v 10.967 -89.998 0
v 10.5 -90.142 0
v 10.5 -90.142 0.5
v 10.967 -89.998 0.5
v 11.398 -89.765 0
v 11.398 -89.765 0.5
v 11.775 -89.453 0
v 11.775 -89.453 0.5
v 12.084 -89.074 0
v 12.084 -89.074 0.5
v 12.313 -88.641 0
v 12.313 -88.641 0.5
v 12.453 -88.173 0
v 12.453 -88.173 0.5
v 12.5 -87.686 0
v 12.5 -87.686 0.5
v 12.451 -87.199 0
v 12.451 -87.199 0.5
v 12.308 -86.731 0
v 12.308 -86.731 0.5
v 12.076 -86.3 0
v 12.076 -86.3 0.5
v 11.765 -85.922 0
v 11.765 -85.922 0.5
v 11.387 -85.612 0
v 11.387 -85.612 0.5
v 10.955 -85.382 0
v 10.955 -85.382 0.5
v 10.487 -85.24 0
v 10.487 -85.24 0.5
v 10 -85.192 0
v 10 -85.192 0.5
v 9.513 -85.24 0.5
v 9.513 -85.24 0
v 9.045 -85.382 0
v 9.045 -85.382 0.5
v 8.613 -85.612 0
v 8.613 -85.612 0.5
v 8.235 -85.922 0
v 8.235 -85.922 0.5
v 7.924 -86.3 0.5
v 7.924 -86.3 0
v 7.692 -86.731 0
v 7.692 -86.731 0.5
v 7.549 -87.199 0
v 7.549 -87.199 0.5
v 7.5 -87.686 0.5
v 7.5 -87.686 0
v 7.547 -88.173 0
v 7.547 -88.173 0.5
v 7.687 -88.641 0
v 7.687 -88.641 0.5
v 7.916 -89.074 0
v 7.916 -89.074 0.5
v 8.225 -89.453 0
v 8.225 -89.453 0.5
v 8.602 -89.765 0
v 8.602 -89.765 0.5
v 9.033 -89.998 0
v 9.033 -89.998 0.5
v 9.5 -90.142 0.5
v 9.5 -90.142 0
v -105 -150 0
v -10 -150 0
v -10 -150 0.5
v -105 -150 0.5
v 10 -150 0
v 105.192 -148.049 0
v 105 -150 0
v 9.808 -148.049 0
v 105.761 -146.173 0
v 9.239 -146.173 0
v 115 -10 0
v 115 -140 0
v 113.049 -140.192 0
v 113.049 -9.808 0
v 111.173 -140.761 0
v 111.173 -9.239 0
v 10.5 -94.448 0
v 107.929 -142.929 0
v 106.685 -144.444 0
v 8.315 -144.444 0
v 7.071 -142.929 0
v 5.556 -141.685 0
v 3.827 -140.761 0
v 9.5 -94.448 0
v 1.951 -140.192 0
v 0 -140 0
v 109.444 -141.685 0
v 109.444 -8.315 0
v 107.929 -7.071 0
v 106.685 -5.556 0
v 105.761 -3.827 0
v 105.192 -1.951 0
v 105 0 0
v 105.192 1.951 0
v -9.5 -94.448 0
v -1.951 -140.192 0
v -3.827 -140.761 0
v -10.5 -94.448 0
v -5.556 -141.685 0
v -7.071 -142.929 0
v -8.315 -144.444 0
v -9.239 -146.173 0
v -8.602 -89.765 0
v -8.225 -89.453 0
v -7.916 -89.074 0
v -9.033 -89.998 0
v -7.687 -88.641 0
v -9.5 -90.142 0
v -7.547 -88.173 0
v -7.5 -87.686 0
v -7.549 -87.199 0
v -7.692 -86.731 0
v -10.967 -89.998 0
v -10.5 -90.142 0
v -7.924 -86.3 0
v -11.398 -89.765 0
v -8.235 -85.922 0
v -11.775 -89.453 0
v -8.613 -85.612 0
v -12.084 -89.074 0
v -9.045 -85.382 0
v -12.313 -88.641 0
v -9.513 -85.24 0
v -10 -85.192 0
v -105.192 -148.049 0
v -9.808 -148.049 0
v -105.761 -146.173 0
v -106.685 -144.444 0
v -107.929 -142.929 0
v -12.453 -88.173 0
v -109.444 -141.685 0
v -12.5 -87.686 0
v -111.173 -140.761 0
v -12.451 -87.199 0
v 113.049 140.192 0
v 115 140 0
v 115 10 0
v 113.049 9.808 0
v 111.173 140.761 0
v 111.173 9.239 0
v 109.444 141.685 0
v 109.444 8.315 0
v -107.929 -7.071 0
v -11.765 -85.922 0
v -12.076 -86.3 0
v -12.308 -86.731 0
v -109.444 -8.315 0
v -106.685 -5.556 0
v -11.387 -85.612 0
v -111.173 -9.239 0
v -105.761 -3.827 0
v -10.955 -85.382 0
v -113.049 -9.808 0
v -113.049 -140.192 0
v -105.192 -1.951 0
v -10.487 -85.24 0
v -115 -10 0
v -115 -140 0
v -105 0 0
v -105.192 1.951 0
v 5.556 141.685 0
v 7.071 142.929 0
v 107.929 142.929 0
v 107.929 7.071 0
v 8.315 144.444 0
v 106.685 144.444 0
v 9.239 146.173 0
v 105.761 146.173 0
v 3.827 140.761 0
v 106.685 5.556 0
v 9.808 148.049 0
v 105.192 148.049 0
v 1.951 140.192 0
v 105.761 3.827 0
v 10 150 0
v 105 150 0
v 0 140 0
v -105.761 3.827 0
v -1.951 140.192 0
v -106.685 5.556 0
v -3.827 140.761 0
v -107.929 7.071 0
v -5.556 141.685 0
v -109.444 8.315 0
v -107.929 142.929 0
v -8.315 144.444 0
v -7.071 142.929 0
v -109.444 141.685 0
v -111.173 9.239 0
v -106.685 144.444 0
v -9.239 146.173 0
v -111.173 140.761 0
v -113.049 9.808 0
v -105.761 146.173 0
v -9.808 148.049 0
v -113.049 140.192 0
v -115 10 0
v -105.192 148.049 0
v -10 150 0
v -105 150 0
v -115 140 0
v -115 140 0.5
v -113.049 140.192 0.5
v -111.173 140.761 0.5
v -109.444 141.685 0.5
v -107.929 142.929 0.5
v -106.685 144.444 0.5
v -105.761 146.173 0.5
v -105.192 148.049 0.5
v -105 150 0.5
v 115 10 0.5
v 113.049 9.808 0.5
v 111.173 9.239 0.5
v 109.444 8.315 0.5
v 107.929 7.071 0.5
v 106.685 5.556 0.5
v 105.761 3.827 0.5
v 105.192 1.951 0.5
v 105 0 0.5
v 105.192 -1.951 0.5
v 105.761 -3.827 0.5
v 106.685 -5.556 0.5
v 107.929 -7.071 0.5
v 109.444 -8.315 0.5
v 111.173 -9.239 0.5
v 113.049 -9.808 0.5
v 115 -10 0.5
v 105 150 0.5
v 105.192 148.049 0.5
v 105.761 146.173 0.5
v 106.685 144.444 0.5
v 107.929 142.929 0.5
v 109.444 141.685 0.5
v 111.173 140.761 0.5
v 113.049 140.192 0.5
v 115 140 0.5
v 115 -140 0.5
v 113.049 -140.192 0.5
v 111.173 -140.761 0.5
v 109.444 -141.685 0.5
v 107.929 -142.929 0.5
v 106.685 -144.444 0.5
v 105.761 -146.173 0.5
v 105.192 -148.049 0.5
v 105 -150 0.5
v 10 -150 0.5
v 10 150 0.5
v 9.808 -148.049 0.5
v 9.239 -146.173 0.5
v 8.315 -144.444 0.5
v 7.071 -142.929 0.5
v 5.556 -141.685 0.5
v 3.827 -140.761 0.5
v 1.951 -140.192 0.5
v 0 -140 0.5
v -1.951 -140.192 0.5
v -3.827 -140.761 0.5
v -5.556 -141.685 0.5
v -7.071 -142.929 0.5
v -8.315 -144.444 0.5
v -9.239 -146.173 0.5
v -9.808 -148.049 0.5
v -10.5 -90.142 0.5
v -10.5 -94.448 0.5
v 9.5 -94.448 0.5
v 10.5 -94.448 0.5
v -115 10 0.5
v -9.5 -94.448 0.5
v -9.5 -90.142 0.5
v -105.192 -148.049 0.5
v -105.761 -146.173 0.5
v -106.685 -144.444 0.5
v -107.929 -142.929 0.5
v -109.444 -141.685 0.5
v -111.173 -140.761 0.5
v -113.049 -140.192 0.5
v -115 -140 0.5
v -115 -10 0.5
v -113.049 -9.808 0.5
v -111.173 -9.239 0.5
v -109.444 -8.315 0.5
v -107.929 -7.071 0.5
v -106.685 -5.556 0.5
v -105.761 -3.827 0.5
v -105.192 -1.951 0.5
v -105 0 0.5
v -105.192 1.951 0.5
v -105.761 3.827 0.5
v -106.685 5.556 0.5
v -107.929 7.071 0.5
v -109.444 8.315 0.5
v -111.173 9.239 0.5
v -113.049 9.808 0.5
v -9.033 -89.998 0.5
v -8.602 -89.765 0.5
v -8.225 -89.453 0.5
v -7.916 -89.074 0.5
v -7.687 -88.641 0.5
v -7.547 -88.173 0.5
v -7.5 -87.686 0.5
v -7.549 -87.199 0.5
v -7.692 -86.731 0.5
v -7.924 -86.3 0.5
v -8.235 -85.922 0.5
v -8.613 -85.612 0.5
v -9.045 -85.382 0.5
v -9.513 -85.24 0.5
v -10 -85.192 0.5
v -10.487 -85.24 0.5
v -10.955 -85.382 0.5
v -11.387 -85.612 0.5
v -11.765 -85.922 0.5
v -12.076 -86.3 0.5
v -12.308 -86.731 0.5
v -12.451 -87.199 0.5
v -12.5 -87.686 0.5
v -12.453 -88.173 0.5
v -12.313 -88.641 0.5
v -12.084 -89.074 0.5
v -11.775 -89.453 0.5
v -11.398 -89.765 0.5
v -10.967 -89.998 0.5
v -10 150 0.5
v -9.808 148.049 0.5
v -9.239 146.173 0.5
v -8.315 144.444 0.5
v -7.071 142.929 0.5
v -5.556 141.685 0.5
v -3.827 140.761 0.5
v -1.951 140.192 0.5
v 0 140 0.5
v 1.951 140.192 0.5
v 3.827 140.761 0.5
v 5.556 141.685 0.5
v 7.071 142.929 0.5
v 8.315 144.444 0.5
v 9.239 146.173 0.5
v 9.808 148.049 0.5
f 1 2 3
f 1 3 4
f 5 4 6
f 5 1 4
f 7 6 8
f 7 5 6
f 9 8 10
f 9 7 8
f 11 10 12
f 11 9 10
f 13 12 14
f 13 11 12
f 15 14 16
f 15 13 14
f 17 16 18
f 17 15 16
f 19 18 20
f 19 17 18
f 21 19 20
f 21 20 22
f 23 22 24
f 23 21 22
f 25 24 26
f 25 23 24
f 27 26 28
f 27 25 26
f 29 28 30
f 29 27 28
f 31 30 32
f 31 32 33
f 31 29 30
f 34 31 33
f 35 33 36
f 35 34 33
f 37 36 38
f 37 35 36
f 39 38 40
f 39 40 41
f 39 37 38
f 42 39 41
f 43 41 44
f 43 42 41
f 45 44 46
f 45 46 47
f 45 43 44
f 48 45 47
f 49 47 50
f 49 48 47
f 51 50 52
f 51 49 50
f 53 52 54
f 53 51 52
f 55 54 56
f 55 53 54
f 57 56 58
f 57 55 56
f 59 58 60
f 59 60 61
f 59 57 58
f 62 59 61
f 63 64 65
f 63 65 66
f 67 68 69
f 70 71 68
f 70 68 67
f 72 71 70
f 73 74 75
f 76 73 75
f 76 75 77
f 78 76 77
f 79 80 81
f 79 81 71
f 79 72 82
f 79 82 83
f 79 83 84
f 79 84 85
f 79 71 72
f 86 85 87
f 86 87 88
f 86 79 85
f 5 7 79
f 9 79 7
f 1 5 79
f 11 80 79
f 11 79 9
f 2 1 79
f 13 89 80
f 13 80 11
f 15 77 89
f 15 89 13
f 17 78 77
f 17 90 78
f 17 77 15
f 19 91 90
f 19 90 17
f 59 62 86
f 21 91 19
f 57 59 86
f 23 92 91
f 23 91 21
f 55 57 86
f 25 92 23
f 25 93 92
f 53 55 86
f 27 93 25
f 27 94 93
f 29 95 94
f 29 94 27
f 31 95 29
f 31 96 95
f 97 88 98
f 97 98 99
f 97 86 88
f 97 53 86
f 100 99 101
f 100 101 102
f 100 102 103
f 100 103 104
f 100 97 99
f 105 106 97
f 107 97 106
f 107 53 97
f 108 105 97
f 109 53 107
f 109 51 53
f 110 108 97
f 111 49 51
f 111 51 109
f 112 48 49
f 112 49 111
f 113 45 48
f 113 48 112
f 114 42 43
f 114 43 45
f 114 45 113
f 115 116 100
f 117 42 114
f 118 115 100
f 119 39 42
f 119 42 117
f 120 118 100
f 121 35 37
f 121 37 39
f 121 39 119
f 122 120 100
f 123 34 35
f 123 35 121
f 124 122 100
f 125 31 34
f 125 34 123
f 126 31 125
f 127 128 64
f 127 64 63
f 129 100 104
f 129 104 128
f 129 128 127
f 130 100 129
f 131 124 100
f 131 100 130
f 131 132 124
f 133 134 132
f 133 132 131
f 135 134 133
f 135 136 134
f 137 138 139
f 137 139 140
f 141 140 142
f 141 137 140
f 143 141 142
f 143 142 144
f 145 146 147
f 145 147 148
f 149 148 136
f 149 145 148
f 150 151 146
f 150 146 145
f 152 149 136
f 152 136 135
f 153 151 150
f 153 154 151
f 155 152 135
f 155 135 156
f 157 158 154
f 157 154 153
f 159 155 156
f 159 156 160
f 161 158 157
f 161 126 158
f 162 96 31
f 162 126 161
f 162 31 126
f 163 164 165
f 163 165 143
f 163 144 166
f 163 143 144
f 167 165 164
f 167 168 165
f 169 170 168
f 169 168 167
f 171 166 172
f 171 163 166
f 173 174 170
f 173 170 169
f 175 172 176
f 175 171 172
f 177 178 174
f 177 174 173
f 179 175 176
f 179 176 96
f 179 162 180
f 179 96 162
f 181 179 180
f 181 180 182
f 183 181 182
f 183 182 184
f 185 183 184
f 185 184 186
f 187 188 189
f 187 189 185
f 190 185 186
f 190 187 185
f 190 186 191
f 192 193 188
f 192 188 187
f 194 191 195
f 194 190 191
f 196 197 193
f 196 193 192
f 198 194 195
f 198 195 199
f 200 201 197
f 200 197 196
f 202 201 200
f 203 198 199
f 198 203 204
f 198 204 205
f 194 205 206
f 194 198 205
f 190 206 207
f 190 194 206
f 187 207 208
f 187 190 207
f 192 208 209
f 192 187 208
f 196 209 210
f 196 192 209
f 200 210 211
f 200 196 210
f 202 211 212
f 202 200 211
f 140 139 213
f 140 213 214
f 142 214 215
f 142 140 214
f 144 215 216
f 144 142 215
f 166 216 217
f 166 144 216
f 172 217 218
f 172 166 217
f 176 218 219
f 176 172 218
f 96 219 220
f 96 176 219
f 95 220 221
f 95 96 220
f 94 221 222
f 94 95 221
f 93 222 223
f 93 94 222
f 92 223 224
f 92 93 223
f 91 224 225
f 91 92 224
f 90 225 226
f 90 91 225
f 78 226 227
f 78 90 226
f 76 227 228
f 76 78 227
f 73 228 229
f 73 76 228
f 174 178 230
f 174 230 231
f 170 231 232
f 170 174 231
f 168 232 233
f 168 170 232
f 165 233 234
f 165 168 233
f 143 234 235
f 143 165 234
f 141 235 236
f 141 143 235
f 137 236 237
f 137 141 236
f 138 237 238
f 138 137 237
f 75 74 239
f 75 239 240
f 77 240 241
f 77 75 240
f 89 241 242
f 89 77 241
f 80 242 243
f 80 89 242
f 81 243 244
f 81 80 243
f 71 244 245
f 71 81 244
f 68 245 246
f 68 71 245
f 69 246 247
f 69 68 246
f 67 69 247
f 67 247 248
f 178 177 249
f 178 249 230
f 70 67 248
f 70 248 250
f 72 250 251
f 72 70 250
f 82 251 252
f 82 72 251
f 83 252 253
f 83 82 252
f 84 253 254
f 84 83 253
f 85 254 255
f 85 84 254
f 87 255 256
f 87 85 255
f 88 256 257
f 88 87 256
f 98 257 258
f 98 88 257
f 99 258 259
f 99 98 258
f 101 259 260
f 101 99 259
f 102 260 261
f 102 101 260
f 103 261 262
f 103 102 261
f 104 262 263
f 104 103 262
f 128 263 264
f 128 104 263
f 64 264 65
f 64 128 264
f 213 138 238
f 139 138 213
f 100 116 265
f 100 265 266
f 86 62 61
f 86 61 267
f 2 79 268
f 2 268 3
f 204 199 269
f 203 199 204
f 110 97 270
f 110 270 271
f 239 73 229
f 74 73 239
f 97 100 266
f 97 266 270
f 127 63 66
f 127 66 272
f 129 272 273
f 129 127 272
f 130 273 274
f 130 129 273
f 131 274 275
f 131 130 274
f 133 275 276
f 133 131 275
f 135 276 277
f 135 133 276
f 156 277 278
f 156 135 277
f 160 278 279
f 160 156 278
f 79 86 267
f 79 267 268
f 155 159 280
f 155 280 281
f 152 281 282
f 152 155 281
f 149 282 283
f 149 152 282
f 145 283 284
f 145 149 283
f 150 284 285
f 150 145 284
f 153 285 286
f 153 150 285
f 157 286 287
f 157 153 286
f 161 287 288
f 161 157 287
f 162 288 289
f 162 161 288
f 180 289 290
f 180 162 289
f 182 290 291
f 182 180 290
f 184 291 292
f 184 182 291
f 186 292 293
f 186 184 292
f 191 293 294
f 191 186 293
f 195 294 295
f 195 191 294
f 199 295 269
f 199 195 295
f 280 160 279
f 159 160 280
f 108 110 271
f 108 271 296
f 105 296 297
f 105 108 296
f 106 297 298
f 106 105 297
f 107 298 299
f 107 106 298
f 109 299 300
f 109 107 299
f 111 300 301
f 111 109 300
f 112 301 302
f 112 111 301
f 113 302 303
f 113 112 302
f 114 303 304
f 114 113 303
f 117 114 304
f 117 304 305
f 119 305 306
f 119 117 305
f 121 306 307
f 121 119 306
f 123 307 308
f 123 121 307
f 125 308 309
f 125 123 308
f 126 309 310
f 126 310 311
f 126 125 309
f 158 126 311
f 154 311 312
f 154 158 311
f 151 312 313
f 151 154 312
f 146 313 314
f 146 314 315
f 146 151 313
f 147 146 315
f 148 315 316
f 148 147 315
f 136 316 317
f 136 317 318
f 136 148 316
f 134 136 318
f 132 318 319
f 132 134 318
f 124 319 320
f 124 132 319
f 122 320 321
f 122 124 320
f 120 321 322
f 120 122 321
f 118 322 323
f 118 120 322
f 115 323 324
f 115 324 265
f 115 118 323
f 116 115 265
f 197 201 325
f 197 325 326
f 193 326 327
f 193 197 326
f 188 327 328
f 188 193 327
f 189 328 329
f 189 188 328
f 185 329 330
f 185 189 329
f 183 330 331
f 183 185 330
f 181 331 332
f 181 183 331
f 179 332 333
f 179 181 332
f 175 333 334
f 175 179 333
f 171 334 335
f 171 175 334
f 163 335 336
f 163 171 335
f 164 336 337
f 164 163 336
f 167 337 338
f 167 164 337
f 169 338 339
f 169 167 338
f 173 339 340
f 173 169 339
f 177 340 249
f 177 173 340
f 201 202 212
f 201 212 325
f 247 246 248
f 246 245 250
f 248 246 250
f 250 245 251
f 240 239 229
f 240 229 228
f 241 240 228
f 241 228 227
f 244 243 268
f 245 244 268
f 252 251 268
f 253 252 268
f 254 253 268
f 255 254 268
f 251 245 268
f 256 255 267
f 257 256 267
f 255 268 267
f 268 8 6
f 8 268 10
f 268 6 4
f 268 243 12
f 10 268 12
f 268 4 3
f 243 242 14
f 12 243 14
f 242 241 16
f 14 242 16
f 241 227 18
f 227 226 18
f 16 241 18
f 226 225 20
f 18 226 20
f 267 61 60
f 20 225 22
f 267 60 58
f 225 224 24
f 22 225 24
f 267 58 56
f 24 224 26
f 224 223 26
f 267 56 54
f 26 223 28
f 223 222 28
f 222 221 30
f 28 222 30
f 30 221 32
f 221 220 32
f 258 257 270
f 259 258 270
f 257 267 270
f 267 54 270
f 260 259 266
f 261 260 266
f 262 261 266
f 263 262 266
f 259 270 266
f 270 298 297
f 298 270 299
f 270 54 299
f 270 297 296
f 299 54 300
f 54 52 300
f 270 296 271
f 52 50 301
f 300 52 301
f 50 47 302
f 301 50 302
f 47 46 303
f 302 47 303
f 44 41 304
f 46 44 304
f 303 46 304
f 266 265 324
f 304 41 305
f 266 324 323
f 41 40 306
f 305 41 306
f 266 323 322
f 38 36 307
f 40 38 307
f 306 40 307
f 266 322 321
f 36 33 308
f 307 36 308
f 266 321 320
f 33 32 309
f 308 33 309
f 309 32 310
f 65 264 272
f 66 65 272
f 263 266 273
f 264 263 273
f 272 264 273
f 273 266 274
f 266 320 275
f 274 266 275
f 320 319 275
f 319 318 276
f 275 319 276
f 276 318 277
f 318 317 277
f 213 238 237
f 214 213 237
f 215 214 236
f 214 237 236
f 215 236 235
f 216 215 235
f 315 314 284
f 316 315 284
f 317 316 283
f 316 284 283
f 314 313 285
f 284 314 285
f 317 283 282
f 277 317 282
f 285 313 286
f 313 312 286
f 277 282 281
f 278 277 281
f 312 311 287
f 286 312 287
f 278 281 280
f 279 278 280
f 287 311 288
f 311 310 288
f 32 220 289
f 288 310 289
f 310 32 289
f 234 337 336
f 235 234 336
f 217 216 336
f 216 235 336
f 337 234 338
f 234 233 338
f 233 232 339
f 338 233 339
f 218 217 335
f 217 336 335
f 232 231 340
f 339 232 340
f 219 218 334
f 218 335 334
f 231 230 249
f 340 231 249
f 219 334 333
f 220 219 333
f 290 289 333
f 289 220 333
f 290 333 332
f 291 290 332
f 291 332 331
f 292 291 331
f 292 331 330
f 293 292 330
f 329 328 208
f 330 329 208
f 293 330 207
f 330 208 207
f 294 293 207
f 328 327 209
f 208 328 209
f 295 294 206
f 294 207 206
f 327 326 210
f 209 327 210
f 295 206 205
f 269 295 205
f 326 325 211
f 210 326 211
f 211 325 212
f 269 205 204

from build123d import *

# Parameters (mm, degrees)
BOSS_EXTRUDE1_DEPTH = 0.5


with BuildPart() as part:
    # Sketch1 → Boss-Extrude1 (new body)
    with BuildSketch(Plane(origin=(0, 0, 0), x_dir=(-1, 0, 0), z_dir=(0, 0, -1))):
        with BuildLine():
            Line((105, 150), (10, 150))
            ThreePointArc((10, 150), (0, 140), (-10, 150))
            Line((-10, 150), (-105, 150))
            ThreePointArc((-105, 150), (-107.928932188, 142.928932188), (-115, 140))
            Line((-115, 140), (-115, 10))
            ThreePointArc((-115, 10), (-105, 0), (-115, -10))
            Line((-115, -10), (-115, -140))
            ThreePointArc((-115, -140), (-107.928932188, -142.928932188), (-105, -150))
            Line((-105, -150), (-10, -150))
            ThreePointArc((-10, -150), (0, -140), (10, -150))
            Line((10, -150), (105, -150))
            ThreePointArc((105, -150), (107.928932188, -142.928932188), (115, -140))
            Line((115, -140), (115, -10))
            ThreePointArc((115, -10), (105, 0), (115, 10))
            Line((115, 10), (115, 140))
            ThreePointArc((115, 140), (107.928932188, 142.928932188), (105, 150))
        make_face()
        with BuildLine():
            Line((9.5, -94.448385239), (9.5, -90.141798169))
            ThreePointArc((9.5, -90.141798169), (10, -85.192308426), (10.5, -90.141798169))
            Line((10.5, -90.141798169), (10.5, -94.448385239))
            Line((10.5, -94.448385239), (9.5, -94.448385239))
        make_face(mode=Mode.SUBTRACT)
        with BuildLine():
            Line((-10.5, -94.448385239), (-10.5, -90.141798169))
            ThreePointArc((-10.5, -90.141798169), (-10, -85.192308426), (-9.5, -90.141798169))
            Line((-9.5, -90.141798169), (-9.5, -94.448385239))
            Line((-9.5, -94.448385239), (-10.5, -94.448385239))
        make_face(mode=Mode.SUBTRACT)
    extrude(amount=-BOSS_EXTRUDE1_DEPTH)


solid = part.part
